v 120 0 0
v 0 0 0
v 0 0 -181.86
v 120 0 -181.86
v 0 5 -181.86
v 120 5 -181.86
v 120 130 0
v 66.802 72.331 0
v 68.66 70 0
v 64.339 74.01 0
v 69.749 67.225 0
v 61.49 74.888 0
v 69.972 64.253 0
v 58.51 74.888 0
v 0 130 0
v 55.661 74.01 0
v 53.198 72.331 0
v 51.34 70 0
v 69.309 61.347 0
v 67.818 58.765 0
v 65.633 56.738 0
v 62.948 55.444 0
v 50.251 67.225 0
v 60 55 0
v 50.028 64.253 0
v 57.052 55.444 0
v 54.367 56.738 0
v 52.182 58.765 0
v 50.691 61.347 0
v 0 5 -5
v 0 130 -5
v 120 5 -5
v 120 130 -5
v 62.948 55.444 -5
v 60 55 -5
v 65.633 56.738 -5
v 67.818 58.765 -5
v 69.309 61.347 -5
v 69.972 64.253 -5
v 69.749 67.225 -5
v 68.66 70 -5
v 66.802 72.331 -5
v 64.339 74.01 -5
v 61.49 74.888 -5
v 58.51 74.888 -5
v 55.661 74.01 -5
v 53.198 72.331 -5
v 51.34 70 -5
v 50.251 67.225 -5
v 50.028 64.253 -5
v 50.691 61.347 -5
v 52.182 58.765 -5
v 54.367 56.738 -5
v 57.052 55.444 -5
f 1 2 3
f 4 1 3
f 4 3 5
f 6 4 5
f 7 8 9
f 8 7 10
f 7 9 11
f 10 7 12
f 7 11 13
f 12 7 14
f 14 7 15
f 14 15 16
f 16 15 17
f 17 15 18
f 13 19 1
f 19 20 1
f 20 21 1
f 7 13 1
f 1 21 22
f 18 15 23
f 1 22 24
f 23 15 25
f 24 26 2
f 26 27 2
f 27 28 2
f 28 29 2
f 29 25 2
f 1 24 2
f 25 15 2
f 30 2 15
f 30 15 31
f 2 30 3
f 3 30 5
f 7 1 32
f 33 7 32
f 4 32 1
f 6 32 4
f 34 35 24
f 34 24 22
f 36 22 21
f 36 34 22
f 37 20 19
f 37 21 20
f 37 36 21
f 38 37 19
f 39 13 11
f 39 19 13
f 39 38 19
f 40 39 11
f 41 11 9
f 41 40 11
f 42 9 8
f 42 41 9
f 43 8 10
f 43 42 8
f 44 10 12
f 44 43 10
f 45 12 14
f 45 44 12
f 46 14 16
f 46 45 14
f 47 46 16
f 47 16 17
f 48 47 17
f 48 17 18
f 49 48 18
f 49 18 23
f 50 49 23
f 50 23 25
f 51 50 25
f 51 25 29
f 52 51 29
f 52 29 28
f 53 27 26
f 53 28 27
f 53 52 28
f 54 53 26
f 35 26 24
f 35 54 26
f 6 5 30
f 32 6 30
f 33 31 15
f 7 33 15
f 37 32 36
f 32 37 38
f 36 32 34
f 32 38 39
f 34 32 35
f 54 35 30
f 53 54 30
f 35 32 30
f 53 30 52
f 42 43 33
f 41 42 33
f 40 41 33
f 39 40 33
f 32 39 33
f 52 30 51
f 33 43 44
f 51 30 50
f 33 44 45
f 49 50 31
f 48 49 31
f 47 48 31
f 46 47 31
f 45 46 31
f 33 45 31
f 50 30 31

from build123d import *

# Parameters (mm, degrees)
EXTRUDE_1_DEPTH          = 120
CUT_EXTRUDE_1_DEPTH      = 34
CUT_EXTRUDE_1_DEPTH_BACK = 21
SKETCH_3_R               = 10


with BuildPart() as part:
    # 草图2 → 凸台-拉伸1 (new body)
    with BuildSketch(Plane(origin=(0, 0, 0), x_dir=(0, 0, -1), z_dir=(1, 0, 0))):
        Polygon((0, 0), (181.86, 0), (181.86, 5), (5, 5), (5, 130), (0, 130), align=None)
    extrude(amount=EXTRUDE_1_DEPTH)

    # 草图3 → 切除-拉伸1 (cut, two sides: drawn at the far end of the back side and taken through both)
    with BuildSketch(Plane.XY.offset(-CUT_EXTRUDE_1_DEPTH_BACK)):
        with Locations(Location((60, 65, 0), (0, 0, 270))):
            Circle(SKETCH_3_R)
    extrude(amount=CUT_EXTRUDE_1_DEPTH + CUT_EXTRUDE_1_DEPTH_BACK, mode=Mode.SUBTRACT)


solid = part.part
